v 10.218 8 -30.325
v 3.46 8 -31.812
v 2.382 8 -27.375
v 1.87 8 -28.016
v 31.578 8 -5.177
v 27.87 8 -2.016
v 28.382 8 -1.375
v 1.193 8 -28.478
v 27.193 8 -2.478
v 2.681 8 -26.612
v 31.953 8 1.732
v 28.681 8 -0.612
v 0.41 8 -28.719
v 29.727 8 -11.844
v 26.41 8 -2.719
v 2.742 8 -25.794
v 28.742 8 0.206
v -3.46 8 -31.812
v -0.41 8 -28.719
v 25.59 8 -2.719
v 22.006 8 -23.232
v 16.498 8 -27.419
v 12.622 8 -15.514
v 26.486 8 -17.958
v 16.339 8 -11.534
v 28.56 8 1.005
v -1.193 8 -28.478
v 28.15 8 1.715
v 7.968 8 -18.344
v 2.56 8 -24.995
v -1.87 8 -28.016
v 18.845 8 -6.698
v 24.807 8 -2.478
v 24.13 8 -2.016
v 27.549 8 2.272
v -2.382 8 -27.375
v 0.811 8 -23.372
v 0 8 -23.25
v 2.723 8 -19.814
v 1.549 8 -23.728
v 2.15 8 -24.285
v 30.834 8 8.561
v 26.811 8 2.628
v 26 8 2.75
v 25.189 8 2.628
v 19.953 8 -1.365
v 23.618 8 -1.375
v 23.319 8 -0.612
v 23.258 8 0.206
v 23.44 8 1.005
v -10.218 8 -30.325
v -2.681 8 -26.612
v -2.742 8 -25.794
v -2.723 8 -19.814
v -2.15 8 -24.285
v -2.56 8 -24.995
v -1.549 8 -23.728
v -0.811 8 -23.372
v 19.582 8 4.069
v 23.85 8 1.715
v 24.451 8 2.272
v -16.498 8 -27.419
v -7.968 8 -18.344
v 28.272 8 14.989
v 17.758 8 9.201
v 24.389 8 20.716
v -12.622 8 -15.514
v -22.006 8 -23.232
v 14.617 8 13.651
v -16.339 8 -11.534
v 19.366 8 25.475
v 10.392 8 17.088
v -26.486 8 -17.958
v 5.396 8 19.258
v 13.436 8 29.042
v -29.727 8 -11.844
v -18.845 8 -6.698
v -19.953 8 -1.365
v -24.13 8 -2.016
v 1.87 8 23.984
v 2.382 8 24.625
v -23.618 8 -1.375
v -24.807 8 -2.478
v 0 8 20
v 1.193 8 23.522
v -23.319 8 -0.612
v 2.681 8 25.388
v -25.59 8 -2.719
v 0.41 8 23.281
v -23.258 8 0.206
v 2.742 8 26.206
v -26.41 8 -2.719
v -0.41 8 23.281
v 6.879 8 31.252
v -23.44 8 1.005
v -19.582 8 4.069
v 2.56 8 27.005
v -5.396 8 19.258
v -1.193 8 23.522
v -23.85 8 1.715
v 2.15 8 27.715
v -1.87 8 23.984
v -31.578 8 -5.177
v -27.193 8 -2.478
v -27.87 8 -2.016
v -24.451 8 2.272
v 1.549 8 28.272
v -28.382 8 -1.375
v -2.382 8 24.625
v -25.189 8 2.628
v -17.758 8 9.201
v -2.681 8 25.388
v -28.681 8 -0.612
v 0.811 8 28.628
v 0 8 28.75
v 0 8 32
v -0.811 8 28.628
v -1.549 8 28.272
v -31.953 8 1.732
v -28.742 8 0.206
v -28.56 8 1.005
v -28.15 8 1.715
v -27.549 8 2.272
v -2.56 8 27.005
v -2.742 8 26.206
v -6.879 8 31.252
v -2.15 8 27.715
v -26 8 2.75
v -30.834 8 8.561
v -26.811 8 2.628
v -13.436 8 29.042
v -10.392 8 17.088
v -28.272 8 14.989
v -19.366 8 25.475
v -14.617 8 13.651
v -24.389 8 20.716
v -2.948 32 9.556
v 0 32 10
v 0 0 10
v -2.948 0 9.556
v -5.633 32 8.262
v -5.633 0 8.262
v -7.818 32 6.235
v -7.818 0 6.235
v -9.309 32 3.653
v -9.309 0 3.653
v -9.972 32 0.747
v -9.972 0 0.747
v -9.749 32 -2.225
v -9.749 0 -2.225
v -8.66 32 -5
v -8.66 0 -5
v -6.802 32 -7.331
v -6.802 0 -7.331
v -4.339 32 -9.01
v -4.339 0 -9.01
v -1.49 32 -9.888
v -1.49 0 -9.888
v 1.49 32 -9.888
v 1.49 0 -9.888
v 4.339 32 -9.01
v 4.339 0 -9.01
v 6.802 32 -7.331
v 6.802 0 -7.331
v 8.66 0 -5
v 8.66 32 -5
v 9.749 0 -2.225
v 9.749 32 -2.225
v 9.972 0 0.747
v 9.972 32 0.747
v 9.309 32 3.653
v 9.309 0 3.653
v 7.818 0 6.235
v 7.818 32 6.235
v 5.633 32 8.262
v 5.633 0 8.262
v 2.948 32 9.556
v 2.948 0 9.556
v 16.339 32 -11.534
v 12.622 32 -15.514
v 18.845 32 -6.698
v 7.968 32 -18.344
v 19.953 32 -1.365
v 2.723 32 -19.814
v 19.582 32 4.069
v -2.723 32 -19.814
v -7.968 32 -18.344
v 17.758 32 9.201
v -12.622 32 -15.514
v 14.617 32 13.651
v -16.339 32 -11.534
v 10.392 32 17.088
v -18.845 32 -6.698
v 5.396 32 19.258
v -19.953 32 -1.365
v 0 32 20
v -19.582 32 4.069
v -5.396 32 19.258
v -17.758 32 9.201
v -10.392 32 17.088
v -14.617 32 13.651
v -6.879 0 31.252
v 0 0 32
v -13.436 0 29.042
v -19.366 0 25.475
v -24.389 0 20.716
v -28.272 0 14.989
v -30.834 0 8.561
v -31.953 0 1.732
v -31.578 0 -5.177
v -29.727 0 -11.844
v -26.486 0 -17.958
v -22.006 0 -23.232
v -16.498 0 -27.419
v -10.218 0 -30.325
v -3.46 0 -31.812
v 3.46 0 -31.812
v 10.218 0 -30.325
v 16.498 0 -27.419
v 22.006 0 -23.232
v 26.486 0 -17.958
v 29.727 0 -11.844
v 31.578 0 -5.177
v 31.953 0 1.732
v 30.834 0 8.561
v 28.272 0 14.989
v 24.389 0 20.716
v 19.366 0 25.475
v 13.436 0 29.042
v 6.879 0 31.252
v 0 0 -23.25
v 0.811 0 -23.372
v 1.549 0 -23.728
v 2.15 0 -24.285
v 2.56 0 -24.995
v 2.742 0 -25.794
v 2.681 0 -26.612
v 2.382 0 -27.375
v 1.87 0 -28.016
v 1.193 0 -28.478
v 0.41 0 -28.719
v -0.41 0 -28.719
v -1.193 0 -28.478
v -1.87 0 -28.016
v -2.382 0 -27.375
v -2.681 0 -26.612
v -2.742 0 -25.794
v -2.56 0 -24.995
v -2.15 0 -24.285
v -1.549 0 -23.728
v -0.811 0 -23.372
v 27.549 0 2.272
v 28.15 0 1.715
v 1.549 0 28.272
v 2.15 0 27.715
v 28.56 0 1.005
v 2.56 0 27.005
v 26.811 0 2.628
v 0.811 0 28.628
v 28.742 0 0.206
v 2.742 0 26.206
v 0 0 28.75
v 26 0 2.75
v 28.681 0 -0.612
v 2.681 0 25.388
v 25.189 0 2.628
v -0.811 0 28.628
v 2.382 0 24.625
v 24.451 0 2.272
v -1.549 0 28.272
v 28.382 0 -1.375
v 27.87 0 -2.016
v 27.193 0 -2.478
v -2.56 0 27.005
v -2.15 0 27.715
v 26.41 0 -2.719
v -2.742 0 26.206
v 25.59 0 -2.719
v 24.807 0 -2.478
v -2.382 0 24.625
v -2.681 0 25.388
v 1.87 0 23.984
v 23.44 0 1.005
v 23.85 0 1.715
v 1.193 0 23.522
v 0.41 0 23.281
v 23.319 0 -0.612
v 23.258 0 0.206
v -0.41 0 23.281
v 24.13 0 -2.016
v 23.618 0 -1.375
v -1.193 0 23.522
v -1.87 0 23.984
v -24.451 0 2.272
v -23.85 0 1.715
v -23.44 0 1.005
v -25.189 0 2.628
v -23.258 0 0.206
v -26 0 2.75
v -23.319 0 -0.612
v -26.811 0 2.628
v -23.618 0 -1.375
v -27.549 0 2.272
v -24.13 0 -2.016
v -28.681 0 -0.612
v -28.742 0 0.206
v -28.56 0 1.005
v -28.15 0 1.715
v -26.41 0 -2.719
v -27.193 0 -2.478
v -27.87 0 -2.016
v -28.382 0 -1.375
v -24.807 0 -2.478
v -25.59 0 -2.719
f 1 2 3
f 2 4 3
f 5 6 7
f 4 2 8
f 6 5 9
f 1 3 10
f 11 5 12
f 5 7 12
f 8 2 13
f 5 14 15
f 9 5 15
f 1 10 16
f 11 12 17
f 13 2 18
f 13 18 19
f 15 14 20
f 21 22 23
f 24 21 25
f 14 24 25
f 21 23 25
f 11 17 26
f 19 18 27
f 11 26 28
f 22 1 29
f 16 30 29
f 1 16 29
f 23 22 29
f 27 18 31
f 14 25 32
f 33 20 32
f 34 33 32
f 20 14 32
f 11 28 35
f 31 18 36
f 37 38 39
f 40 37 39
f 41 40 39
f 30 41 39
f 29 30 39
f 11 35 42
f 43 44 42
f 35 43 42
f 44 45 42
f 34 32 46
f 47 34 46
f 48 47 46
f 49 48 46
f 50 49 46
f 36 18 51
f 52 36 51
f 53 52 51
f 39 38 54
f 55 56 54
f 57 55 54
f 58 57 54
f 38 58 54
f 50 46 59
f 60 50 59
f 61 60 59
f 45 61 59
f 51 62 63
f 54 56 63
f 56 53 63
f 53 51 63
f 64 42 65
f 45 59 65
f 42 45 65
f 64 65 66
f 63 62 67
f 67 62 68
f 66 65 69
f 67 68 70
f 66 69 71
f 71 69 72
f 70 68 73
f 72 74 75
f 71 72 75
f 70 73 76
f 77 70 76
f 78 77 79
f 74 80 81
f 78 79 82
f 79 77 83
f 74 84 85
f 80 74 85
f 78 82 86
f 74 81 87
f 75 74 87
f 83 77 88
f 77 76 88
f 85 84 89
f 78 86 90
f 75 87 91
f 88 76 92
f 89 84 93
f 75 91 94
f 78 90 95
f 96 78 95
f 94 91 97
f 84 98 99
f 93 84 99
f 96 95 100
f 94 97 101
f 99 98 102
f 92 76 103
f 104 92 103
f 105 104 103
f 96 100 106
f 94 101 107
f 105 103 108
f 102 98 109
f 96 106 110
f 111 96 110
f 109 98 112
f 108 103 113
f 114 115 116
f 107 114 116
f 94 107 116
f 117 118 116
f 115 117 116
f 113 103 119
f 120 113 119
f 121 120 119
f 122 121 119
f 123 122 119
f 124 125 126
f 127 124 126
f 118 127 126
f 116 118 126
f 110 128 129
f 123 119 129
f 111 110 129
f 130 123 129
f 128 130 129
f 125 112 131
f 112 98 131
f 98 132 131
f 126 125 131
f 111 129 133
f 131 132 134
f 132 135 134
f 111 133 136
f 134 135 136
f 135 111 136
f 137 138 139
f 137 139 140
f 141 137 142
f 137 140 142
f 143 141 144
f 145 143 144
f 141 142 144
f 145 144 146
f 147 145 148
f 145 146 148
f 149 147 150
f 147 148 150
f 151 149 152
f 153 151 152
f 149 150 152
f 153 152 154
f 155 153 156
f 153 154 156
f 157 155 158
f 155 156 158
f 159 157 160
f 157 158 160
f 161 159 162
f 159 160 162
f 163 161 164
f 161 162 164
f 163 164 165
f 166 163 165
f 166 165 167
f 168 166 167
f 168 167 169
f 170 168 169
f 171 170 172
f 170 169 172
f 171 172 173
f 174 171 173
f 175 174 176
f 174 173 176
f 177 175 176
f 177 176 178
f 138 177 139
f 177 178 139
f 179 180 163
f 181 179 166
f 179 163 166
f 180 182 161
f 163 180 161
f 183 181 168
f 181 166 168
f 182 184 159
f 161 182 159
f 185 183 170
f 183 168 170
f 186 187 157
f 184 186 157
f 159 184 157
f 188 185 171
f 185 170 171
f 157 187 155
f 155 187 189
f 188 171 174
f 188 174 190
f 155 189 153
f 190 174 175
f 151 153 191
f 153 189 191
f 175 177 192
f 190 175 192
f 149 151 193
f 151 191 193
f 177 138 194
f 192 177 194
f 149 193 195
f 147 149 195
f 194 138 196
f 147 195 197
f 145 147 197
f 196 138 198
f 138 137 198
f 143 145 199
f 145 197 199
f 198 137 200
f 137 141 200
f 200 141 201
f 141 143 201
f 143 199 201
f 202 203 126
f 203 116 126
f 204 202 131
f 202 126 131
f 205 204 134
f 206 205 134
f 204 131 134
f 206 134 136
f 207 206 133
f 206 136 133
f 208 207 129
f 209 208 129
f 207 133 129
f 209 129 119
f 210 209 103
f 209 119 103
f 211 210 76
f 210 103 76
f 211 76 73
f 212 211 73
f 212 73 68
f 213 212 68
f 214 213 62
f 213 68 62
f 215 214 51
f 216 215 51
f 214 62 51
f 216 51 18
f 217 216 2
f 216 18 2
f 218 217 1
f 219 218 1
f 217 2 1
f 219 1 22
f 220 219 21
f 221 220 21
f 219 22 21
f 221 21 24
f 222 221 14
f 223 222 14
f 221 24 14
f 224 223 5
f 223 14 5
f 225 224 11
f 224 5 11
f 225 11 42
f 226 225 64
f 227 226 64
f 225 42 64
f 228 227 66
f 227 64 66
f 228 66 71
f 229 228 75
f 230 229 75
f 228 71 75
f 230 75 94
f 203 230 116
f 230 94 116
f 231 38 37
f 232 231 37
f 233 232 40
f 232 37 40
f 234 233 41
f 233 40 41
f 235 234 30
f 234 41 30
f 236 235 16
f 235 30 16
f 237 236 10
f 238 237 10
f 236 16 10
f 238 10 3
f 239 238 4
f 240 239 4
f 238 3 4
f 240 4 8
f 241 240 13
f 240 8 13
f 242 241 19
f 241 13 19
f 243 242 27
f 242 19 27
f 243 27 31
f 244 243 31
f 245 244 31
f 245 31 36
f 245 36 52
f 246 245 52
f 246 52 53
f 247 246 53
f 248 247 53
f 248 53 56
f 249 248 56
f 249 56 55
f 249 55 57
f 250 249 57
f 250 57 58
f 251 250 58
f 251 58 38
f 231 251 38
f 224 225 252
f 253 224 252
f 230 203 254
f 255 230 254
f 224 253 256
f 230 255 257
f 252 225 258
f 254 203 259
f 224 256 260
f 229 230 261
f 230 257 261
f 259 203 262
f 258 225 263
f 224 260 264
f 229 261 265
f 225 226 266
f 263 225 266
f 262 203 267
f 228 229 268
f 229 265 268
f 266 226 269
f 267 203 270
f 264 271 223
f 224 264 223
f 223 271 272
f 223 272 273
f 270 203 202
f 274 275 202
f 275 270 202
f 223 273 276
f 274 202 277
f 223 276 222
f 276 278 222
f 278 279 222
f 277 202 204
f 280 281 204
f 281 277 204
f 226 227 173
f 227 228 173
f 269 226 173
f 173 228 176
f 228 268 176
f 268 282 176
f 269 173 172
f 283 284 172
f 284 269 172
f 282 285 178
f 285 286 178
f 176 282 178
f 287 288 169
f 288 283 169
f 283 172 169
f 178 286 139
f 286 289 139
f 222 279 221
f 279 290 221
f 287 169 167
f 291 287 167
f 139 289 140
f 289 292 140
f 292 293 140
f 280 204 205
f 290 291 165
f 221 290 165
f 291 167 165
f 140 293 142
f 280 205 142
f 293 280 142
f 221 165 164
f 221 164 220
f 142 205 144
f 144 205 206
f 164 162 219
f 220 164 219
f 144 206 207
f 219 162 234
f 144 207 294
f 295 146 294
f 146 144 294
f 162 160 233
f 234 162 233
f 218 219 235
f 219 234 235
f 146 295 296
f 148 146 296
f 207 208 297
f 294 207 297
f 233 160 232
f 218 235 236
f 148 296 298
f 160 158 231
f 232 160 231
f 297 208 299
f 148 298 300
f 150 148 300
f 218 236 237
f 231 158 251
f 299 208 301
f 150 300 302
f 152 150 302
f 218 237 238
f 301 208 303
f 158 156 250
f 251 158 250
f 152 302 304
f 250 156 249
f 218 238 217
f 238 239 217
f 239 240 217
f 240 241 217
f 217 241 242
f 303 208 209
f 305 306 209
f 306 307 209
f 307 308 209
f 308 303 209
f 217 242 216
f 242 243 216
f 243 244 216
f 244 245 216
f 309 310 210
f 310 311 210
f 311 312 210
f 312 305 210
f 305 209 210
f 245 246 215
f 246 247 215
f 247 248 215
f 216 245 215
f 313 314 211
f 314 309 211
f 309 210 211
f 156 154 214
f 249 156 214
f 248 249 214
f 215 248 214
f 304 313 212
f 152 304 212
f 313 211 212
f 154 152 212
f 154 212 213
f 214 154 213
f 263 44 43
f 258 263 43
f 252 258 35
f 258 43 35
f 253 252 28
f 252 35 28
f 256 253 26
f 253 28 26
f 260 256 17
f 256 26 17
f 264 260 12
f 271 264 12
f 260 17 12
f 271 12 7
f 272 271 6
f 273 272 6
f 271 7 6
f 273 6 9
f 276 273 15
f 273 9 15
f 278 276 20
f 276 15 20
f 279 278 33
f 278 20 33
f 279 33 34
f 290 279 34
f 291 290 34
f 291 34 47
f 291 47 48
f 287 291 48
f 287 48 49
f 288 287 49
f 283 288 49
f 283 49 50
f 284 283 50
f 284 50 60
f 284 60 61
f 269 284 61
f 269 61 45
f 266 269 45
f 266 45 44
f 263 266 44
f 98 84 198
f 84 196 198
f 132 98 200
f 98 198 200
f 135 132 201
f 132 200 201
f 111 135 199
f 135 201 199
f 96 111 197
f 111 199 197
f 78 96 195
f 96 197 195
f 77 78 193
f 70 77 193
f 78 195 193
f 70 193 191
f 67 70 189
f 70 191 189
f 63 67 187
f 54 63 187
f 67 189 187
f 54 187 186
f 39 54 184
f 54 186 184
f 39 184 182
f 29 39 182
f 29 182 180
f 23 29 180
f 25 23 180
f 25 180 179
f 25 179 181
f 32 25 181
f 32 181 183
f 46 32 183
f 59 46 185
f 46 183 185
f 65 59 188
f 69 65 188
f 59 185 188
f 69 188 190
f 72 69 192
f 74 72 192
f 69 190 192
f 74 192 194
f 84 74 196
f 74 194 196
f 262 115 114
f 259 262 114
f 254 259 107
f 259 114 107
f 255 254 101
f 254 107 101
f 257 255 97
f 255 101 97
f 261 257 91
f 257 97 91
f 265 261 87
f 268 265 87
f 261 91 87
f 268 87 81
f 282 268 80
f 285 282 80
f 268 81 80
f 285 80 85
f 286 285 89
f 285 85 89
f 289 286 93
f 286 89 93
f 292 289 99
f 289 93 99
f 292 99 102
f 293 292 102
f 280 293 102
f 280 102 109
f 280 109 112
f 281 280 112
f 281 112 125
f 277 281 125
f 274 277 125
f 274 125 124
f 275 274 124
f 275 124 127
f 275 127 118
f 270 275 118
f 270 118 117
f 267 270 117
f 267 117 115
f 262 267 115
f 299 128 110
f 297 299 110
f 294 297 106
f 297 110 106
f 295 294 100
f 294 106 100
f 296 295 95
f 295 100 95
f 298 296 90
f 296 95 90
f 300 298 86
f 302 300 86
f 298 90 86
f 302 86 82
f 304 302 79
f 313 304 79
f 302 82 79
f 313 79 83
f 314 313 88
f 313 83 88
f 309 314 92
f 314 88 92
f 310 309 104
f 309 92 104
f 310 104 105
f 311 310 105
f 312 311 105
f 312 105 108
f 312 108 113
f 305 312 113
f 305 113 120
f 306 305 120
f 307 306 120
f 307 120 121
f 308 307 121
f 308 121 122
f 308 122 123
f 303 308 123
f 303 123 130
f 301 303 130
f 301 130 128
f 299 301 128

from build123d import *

# Parameters (mm, degrees)
SKETCH_2_R          = 2.75
CUT_EXTRUDE_1_DEPTH = 10


with BuildPart() as part:
    # 草图1 → 旋转1 (revolve)
    with BuildSketch(Plane.XY, mode=Mode.PRIVATE) as revolve_1_sk:
        Polygon((-10, 0), (-32, 0), (-32, 8), (-20, 8), (-20, 32), (-10, 32), align=None)
    revolve(revolve_1_sk.sketch.rotate(Axis((0, 79.352678571, 0), (0, -1, 0)), 270), axis=Axis((0, 79.352678571, 0), (0, -1, 0)))

    # 草图2 → 切除-拉伸1 (cut)
    with BuildSketch(Plane(origin=(0, 8, 0), x_dir=(1, 0, 0), z_dir=(0, 1, 0))):
        with Locations(Location((0, 26, 0), (0, 0, 270))):
            Circle(SKETCH_2_R)
        with Locations(Location((26, 0, 0), (0, 0, 270))):
            Circle(SKETCH_2_R)
        with Locations(Location((0, -26, 0), (0, 0, 270))):
            Circle(SKETCH_2_R)
        with Locations(Location((-26, 0, 0), (0, 0, 270))):
            Circle(SKETCH_2_R)
    extrude(amount=-CUT_EXTRUDE_1_DEPTH, mode=Mode.SUBTRACT)


solid = part.part
